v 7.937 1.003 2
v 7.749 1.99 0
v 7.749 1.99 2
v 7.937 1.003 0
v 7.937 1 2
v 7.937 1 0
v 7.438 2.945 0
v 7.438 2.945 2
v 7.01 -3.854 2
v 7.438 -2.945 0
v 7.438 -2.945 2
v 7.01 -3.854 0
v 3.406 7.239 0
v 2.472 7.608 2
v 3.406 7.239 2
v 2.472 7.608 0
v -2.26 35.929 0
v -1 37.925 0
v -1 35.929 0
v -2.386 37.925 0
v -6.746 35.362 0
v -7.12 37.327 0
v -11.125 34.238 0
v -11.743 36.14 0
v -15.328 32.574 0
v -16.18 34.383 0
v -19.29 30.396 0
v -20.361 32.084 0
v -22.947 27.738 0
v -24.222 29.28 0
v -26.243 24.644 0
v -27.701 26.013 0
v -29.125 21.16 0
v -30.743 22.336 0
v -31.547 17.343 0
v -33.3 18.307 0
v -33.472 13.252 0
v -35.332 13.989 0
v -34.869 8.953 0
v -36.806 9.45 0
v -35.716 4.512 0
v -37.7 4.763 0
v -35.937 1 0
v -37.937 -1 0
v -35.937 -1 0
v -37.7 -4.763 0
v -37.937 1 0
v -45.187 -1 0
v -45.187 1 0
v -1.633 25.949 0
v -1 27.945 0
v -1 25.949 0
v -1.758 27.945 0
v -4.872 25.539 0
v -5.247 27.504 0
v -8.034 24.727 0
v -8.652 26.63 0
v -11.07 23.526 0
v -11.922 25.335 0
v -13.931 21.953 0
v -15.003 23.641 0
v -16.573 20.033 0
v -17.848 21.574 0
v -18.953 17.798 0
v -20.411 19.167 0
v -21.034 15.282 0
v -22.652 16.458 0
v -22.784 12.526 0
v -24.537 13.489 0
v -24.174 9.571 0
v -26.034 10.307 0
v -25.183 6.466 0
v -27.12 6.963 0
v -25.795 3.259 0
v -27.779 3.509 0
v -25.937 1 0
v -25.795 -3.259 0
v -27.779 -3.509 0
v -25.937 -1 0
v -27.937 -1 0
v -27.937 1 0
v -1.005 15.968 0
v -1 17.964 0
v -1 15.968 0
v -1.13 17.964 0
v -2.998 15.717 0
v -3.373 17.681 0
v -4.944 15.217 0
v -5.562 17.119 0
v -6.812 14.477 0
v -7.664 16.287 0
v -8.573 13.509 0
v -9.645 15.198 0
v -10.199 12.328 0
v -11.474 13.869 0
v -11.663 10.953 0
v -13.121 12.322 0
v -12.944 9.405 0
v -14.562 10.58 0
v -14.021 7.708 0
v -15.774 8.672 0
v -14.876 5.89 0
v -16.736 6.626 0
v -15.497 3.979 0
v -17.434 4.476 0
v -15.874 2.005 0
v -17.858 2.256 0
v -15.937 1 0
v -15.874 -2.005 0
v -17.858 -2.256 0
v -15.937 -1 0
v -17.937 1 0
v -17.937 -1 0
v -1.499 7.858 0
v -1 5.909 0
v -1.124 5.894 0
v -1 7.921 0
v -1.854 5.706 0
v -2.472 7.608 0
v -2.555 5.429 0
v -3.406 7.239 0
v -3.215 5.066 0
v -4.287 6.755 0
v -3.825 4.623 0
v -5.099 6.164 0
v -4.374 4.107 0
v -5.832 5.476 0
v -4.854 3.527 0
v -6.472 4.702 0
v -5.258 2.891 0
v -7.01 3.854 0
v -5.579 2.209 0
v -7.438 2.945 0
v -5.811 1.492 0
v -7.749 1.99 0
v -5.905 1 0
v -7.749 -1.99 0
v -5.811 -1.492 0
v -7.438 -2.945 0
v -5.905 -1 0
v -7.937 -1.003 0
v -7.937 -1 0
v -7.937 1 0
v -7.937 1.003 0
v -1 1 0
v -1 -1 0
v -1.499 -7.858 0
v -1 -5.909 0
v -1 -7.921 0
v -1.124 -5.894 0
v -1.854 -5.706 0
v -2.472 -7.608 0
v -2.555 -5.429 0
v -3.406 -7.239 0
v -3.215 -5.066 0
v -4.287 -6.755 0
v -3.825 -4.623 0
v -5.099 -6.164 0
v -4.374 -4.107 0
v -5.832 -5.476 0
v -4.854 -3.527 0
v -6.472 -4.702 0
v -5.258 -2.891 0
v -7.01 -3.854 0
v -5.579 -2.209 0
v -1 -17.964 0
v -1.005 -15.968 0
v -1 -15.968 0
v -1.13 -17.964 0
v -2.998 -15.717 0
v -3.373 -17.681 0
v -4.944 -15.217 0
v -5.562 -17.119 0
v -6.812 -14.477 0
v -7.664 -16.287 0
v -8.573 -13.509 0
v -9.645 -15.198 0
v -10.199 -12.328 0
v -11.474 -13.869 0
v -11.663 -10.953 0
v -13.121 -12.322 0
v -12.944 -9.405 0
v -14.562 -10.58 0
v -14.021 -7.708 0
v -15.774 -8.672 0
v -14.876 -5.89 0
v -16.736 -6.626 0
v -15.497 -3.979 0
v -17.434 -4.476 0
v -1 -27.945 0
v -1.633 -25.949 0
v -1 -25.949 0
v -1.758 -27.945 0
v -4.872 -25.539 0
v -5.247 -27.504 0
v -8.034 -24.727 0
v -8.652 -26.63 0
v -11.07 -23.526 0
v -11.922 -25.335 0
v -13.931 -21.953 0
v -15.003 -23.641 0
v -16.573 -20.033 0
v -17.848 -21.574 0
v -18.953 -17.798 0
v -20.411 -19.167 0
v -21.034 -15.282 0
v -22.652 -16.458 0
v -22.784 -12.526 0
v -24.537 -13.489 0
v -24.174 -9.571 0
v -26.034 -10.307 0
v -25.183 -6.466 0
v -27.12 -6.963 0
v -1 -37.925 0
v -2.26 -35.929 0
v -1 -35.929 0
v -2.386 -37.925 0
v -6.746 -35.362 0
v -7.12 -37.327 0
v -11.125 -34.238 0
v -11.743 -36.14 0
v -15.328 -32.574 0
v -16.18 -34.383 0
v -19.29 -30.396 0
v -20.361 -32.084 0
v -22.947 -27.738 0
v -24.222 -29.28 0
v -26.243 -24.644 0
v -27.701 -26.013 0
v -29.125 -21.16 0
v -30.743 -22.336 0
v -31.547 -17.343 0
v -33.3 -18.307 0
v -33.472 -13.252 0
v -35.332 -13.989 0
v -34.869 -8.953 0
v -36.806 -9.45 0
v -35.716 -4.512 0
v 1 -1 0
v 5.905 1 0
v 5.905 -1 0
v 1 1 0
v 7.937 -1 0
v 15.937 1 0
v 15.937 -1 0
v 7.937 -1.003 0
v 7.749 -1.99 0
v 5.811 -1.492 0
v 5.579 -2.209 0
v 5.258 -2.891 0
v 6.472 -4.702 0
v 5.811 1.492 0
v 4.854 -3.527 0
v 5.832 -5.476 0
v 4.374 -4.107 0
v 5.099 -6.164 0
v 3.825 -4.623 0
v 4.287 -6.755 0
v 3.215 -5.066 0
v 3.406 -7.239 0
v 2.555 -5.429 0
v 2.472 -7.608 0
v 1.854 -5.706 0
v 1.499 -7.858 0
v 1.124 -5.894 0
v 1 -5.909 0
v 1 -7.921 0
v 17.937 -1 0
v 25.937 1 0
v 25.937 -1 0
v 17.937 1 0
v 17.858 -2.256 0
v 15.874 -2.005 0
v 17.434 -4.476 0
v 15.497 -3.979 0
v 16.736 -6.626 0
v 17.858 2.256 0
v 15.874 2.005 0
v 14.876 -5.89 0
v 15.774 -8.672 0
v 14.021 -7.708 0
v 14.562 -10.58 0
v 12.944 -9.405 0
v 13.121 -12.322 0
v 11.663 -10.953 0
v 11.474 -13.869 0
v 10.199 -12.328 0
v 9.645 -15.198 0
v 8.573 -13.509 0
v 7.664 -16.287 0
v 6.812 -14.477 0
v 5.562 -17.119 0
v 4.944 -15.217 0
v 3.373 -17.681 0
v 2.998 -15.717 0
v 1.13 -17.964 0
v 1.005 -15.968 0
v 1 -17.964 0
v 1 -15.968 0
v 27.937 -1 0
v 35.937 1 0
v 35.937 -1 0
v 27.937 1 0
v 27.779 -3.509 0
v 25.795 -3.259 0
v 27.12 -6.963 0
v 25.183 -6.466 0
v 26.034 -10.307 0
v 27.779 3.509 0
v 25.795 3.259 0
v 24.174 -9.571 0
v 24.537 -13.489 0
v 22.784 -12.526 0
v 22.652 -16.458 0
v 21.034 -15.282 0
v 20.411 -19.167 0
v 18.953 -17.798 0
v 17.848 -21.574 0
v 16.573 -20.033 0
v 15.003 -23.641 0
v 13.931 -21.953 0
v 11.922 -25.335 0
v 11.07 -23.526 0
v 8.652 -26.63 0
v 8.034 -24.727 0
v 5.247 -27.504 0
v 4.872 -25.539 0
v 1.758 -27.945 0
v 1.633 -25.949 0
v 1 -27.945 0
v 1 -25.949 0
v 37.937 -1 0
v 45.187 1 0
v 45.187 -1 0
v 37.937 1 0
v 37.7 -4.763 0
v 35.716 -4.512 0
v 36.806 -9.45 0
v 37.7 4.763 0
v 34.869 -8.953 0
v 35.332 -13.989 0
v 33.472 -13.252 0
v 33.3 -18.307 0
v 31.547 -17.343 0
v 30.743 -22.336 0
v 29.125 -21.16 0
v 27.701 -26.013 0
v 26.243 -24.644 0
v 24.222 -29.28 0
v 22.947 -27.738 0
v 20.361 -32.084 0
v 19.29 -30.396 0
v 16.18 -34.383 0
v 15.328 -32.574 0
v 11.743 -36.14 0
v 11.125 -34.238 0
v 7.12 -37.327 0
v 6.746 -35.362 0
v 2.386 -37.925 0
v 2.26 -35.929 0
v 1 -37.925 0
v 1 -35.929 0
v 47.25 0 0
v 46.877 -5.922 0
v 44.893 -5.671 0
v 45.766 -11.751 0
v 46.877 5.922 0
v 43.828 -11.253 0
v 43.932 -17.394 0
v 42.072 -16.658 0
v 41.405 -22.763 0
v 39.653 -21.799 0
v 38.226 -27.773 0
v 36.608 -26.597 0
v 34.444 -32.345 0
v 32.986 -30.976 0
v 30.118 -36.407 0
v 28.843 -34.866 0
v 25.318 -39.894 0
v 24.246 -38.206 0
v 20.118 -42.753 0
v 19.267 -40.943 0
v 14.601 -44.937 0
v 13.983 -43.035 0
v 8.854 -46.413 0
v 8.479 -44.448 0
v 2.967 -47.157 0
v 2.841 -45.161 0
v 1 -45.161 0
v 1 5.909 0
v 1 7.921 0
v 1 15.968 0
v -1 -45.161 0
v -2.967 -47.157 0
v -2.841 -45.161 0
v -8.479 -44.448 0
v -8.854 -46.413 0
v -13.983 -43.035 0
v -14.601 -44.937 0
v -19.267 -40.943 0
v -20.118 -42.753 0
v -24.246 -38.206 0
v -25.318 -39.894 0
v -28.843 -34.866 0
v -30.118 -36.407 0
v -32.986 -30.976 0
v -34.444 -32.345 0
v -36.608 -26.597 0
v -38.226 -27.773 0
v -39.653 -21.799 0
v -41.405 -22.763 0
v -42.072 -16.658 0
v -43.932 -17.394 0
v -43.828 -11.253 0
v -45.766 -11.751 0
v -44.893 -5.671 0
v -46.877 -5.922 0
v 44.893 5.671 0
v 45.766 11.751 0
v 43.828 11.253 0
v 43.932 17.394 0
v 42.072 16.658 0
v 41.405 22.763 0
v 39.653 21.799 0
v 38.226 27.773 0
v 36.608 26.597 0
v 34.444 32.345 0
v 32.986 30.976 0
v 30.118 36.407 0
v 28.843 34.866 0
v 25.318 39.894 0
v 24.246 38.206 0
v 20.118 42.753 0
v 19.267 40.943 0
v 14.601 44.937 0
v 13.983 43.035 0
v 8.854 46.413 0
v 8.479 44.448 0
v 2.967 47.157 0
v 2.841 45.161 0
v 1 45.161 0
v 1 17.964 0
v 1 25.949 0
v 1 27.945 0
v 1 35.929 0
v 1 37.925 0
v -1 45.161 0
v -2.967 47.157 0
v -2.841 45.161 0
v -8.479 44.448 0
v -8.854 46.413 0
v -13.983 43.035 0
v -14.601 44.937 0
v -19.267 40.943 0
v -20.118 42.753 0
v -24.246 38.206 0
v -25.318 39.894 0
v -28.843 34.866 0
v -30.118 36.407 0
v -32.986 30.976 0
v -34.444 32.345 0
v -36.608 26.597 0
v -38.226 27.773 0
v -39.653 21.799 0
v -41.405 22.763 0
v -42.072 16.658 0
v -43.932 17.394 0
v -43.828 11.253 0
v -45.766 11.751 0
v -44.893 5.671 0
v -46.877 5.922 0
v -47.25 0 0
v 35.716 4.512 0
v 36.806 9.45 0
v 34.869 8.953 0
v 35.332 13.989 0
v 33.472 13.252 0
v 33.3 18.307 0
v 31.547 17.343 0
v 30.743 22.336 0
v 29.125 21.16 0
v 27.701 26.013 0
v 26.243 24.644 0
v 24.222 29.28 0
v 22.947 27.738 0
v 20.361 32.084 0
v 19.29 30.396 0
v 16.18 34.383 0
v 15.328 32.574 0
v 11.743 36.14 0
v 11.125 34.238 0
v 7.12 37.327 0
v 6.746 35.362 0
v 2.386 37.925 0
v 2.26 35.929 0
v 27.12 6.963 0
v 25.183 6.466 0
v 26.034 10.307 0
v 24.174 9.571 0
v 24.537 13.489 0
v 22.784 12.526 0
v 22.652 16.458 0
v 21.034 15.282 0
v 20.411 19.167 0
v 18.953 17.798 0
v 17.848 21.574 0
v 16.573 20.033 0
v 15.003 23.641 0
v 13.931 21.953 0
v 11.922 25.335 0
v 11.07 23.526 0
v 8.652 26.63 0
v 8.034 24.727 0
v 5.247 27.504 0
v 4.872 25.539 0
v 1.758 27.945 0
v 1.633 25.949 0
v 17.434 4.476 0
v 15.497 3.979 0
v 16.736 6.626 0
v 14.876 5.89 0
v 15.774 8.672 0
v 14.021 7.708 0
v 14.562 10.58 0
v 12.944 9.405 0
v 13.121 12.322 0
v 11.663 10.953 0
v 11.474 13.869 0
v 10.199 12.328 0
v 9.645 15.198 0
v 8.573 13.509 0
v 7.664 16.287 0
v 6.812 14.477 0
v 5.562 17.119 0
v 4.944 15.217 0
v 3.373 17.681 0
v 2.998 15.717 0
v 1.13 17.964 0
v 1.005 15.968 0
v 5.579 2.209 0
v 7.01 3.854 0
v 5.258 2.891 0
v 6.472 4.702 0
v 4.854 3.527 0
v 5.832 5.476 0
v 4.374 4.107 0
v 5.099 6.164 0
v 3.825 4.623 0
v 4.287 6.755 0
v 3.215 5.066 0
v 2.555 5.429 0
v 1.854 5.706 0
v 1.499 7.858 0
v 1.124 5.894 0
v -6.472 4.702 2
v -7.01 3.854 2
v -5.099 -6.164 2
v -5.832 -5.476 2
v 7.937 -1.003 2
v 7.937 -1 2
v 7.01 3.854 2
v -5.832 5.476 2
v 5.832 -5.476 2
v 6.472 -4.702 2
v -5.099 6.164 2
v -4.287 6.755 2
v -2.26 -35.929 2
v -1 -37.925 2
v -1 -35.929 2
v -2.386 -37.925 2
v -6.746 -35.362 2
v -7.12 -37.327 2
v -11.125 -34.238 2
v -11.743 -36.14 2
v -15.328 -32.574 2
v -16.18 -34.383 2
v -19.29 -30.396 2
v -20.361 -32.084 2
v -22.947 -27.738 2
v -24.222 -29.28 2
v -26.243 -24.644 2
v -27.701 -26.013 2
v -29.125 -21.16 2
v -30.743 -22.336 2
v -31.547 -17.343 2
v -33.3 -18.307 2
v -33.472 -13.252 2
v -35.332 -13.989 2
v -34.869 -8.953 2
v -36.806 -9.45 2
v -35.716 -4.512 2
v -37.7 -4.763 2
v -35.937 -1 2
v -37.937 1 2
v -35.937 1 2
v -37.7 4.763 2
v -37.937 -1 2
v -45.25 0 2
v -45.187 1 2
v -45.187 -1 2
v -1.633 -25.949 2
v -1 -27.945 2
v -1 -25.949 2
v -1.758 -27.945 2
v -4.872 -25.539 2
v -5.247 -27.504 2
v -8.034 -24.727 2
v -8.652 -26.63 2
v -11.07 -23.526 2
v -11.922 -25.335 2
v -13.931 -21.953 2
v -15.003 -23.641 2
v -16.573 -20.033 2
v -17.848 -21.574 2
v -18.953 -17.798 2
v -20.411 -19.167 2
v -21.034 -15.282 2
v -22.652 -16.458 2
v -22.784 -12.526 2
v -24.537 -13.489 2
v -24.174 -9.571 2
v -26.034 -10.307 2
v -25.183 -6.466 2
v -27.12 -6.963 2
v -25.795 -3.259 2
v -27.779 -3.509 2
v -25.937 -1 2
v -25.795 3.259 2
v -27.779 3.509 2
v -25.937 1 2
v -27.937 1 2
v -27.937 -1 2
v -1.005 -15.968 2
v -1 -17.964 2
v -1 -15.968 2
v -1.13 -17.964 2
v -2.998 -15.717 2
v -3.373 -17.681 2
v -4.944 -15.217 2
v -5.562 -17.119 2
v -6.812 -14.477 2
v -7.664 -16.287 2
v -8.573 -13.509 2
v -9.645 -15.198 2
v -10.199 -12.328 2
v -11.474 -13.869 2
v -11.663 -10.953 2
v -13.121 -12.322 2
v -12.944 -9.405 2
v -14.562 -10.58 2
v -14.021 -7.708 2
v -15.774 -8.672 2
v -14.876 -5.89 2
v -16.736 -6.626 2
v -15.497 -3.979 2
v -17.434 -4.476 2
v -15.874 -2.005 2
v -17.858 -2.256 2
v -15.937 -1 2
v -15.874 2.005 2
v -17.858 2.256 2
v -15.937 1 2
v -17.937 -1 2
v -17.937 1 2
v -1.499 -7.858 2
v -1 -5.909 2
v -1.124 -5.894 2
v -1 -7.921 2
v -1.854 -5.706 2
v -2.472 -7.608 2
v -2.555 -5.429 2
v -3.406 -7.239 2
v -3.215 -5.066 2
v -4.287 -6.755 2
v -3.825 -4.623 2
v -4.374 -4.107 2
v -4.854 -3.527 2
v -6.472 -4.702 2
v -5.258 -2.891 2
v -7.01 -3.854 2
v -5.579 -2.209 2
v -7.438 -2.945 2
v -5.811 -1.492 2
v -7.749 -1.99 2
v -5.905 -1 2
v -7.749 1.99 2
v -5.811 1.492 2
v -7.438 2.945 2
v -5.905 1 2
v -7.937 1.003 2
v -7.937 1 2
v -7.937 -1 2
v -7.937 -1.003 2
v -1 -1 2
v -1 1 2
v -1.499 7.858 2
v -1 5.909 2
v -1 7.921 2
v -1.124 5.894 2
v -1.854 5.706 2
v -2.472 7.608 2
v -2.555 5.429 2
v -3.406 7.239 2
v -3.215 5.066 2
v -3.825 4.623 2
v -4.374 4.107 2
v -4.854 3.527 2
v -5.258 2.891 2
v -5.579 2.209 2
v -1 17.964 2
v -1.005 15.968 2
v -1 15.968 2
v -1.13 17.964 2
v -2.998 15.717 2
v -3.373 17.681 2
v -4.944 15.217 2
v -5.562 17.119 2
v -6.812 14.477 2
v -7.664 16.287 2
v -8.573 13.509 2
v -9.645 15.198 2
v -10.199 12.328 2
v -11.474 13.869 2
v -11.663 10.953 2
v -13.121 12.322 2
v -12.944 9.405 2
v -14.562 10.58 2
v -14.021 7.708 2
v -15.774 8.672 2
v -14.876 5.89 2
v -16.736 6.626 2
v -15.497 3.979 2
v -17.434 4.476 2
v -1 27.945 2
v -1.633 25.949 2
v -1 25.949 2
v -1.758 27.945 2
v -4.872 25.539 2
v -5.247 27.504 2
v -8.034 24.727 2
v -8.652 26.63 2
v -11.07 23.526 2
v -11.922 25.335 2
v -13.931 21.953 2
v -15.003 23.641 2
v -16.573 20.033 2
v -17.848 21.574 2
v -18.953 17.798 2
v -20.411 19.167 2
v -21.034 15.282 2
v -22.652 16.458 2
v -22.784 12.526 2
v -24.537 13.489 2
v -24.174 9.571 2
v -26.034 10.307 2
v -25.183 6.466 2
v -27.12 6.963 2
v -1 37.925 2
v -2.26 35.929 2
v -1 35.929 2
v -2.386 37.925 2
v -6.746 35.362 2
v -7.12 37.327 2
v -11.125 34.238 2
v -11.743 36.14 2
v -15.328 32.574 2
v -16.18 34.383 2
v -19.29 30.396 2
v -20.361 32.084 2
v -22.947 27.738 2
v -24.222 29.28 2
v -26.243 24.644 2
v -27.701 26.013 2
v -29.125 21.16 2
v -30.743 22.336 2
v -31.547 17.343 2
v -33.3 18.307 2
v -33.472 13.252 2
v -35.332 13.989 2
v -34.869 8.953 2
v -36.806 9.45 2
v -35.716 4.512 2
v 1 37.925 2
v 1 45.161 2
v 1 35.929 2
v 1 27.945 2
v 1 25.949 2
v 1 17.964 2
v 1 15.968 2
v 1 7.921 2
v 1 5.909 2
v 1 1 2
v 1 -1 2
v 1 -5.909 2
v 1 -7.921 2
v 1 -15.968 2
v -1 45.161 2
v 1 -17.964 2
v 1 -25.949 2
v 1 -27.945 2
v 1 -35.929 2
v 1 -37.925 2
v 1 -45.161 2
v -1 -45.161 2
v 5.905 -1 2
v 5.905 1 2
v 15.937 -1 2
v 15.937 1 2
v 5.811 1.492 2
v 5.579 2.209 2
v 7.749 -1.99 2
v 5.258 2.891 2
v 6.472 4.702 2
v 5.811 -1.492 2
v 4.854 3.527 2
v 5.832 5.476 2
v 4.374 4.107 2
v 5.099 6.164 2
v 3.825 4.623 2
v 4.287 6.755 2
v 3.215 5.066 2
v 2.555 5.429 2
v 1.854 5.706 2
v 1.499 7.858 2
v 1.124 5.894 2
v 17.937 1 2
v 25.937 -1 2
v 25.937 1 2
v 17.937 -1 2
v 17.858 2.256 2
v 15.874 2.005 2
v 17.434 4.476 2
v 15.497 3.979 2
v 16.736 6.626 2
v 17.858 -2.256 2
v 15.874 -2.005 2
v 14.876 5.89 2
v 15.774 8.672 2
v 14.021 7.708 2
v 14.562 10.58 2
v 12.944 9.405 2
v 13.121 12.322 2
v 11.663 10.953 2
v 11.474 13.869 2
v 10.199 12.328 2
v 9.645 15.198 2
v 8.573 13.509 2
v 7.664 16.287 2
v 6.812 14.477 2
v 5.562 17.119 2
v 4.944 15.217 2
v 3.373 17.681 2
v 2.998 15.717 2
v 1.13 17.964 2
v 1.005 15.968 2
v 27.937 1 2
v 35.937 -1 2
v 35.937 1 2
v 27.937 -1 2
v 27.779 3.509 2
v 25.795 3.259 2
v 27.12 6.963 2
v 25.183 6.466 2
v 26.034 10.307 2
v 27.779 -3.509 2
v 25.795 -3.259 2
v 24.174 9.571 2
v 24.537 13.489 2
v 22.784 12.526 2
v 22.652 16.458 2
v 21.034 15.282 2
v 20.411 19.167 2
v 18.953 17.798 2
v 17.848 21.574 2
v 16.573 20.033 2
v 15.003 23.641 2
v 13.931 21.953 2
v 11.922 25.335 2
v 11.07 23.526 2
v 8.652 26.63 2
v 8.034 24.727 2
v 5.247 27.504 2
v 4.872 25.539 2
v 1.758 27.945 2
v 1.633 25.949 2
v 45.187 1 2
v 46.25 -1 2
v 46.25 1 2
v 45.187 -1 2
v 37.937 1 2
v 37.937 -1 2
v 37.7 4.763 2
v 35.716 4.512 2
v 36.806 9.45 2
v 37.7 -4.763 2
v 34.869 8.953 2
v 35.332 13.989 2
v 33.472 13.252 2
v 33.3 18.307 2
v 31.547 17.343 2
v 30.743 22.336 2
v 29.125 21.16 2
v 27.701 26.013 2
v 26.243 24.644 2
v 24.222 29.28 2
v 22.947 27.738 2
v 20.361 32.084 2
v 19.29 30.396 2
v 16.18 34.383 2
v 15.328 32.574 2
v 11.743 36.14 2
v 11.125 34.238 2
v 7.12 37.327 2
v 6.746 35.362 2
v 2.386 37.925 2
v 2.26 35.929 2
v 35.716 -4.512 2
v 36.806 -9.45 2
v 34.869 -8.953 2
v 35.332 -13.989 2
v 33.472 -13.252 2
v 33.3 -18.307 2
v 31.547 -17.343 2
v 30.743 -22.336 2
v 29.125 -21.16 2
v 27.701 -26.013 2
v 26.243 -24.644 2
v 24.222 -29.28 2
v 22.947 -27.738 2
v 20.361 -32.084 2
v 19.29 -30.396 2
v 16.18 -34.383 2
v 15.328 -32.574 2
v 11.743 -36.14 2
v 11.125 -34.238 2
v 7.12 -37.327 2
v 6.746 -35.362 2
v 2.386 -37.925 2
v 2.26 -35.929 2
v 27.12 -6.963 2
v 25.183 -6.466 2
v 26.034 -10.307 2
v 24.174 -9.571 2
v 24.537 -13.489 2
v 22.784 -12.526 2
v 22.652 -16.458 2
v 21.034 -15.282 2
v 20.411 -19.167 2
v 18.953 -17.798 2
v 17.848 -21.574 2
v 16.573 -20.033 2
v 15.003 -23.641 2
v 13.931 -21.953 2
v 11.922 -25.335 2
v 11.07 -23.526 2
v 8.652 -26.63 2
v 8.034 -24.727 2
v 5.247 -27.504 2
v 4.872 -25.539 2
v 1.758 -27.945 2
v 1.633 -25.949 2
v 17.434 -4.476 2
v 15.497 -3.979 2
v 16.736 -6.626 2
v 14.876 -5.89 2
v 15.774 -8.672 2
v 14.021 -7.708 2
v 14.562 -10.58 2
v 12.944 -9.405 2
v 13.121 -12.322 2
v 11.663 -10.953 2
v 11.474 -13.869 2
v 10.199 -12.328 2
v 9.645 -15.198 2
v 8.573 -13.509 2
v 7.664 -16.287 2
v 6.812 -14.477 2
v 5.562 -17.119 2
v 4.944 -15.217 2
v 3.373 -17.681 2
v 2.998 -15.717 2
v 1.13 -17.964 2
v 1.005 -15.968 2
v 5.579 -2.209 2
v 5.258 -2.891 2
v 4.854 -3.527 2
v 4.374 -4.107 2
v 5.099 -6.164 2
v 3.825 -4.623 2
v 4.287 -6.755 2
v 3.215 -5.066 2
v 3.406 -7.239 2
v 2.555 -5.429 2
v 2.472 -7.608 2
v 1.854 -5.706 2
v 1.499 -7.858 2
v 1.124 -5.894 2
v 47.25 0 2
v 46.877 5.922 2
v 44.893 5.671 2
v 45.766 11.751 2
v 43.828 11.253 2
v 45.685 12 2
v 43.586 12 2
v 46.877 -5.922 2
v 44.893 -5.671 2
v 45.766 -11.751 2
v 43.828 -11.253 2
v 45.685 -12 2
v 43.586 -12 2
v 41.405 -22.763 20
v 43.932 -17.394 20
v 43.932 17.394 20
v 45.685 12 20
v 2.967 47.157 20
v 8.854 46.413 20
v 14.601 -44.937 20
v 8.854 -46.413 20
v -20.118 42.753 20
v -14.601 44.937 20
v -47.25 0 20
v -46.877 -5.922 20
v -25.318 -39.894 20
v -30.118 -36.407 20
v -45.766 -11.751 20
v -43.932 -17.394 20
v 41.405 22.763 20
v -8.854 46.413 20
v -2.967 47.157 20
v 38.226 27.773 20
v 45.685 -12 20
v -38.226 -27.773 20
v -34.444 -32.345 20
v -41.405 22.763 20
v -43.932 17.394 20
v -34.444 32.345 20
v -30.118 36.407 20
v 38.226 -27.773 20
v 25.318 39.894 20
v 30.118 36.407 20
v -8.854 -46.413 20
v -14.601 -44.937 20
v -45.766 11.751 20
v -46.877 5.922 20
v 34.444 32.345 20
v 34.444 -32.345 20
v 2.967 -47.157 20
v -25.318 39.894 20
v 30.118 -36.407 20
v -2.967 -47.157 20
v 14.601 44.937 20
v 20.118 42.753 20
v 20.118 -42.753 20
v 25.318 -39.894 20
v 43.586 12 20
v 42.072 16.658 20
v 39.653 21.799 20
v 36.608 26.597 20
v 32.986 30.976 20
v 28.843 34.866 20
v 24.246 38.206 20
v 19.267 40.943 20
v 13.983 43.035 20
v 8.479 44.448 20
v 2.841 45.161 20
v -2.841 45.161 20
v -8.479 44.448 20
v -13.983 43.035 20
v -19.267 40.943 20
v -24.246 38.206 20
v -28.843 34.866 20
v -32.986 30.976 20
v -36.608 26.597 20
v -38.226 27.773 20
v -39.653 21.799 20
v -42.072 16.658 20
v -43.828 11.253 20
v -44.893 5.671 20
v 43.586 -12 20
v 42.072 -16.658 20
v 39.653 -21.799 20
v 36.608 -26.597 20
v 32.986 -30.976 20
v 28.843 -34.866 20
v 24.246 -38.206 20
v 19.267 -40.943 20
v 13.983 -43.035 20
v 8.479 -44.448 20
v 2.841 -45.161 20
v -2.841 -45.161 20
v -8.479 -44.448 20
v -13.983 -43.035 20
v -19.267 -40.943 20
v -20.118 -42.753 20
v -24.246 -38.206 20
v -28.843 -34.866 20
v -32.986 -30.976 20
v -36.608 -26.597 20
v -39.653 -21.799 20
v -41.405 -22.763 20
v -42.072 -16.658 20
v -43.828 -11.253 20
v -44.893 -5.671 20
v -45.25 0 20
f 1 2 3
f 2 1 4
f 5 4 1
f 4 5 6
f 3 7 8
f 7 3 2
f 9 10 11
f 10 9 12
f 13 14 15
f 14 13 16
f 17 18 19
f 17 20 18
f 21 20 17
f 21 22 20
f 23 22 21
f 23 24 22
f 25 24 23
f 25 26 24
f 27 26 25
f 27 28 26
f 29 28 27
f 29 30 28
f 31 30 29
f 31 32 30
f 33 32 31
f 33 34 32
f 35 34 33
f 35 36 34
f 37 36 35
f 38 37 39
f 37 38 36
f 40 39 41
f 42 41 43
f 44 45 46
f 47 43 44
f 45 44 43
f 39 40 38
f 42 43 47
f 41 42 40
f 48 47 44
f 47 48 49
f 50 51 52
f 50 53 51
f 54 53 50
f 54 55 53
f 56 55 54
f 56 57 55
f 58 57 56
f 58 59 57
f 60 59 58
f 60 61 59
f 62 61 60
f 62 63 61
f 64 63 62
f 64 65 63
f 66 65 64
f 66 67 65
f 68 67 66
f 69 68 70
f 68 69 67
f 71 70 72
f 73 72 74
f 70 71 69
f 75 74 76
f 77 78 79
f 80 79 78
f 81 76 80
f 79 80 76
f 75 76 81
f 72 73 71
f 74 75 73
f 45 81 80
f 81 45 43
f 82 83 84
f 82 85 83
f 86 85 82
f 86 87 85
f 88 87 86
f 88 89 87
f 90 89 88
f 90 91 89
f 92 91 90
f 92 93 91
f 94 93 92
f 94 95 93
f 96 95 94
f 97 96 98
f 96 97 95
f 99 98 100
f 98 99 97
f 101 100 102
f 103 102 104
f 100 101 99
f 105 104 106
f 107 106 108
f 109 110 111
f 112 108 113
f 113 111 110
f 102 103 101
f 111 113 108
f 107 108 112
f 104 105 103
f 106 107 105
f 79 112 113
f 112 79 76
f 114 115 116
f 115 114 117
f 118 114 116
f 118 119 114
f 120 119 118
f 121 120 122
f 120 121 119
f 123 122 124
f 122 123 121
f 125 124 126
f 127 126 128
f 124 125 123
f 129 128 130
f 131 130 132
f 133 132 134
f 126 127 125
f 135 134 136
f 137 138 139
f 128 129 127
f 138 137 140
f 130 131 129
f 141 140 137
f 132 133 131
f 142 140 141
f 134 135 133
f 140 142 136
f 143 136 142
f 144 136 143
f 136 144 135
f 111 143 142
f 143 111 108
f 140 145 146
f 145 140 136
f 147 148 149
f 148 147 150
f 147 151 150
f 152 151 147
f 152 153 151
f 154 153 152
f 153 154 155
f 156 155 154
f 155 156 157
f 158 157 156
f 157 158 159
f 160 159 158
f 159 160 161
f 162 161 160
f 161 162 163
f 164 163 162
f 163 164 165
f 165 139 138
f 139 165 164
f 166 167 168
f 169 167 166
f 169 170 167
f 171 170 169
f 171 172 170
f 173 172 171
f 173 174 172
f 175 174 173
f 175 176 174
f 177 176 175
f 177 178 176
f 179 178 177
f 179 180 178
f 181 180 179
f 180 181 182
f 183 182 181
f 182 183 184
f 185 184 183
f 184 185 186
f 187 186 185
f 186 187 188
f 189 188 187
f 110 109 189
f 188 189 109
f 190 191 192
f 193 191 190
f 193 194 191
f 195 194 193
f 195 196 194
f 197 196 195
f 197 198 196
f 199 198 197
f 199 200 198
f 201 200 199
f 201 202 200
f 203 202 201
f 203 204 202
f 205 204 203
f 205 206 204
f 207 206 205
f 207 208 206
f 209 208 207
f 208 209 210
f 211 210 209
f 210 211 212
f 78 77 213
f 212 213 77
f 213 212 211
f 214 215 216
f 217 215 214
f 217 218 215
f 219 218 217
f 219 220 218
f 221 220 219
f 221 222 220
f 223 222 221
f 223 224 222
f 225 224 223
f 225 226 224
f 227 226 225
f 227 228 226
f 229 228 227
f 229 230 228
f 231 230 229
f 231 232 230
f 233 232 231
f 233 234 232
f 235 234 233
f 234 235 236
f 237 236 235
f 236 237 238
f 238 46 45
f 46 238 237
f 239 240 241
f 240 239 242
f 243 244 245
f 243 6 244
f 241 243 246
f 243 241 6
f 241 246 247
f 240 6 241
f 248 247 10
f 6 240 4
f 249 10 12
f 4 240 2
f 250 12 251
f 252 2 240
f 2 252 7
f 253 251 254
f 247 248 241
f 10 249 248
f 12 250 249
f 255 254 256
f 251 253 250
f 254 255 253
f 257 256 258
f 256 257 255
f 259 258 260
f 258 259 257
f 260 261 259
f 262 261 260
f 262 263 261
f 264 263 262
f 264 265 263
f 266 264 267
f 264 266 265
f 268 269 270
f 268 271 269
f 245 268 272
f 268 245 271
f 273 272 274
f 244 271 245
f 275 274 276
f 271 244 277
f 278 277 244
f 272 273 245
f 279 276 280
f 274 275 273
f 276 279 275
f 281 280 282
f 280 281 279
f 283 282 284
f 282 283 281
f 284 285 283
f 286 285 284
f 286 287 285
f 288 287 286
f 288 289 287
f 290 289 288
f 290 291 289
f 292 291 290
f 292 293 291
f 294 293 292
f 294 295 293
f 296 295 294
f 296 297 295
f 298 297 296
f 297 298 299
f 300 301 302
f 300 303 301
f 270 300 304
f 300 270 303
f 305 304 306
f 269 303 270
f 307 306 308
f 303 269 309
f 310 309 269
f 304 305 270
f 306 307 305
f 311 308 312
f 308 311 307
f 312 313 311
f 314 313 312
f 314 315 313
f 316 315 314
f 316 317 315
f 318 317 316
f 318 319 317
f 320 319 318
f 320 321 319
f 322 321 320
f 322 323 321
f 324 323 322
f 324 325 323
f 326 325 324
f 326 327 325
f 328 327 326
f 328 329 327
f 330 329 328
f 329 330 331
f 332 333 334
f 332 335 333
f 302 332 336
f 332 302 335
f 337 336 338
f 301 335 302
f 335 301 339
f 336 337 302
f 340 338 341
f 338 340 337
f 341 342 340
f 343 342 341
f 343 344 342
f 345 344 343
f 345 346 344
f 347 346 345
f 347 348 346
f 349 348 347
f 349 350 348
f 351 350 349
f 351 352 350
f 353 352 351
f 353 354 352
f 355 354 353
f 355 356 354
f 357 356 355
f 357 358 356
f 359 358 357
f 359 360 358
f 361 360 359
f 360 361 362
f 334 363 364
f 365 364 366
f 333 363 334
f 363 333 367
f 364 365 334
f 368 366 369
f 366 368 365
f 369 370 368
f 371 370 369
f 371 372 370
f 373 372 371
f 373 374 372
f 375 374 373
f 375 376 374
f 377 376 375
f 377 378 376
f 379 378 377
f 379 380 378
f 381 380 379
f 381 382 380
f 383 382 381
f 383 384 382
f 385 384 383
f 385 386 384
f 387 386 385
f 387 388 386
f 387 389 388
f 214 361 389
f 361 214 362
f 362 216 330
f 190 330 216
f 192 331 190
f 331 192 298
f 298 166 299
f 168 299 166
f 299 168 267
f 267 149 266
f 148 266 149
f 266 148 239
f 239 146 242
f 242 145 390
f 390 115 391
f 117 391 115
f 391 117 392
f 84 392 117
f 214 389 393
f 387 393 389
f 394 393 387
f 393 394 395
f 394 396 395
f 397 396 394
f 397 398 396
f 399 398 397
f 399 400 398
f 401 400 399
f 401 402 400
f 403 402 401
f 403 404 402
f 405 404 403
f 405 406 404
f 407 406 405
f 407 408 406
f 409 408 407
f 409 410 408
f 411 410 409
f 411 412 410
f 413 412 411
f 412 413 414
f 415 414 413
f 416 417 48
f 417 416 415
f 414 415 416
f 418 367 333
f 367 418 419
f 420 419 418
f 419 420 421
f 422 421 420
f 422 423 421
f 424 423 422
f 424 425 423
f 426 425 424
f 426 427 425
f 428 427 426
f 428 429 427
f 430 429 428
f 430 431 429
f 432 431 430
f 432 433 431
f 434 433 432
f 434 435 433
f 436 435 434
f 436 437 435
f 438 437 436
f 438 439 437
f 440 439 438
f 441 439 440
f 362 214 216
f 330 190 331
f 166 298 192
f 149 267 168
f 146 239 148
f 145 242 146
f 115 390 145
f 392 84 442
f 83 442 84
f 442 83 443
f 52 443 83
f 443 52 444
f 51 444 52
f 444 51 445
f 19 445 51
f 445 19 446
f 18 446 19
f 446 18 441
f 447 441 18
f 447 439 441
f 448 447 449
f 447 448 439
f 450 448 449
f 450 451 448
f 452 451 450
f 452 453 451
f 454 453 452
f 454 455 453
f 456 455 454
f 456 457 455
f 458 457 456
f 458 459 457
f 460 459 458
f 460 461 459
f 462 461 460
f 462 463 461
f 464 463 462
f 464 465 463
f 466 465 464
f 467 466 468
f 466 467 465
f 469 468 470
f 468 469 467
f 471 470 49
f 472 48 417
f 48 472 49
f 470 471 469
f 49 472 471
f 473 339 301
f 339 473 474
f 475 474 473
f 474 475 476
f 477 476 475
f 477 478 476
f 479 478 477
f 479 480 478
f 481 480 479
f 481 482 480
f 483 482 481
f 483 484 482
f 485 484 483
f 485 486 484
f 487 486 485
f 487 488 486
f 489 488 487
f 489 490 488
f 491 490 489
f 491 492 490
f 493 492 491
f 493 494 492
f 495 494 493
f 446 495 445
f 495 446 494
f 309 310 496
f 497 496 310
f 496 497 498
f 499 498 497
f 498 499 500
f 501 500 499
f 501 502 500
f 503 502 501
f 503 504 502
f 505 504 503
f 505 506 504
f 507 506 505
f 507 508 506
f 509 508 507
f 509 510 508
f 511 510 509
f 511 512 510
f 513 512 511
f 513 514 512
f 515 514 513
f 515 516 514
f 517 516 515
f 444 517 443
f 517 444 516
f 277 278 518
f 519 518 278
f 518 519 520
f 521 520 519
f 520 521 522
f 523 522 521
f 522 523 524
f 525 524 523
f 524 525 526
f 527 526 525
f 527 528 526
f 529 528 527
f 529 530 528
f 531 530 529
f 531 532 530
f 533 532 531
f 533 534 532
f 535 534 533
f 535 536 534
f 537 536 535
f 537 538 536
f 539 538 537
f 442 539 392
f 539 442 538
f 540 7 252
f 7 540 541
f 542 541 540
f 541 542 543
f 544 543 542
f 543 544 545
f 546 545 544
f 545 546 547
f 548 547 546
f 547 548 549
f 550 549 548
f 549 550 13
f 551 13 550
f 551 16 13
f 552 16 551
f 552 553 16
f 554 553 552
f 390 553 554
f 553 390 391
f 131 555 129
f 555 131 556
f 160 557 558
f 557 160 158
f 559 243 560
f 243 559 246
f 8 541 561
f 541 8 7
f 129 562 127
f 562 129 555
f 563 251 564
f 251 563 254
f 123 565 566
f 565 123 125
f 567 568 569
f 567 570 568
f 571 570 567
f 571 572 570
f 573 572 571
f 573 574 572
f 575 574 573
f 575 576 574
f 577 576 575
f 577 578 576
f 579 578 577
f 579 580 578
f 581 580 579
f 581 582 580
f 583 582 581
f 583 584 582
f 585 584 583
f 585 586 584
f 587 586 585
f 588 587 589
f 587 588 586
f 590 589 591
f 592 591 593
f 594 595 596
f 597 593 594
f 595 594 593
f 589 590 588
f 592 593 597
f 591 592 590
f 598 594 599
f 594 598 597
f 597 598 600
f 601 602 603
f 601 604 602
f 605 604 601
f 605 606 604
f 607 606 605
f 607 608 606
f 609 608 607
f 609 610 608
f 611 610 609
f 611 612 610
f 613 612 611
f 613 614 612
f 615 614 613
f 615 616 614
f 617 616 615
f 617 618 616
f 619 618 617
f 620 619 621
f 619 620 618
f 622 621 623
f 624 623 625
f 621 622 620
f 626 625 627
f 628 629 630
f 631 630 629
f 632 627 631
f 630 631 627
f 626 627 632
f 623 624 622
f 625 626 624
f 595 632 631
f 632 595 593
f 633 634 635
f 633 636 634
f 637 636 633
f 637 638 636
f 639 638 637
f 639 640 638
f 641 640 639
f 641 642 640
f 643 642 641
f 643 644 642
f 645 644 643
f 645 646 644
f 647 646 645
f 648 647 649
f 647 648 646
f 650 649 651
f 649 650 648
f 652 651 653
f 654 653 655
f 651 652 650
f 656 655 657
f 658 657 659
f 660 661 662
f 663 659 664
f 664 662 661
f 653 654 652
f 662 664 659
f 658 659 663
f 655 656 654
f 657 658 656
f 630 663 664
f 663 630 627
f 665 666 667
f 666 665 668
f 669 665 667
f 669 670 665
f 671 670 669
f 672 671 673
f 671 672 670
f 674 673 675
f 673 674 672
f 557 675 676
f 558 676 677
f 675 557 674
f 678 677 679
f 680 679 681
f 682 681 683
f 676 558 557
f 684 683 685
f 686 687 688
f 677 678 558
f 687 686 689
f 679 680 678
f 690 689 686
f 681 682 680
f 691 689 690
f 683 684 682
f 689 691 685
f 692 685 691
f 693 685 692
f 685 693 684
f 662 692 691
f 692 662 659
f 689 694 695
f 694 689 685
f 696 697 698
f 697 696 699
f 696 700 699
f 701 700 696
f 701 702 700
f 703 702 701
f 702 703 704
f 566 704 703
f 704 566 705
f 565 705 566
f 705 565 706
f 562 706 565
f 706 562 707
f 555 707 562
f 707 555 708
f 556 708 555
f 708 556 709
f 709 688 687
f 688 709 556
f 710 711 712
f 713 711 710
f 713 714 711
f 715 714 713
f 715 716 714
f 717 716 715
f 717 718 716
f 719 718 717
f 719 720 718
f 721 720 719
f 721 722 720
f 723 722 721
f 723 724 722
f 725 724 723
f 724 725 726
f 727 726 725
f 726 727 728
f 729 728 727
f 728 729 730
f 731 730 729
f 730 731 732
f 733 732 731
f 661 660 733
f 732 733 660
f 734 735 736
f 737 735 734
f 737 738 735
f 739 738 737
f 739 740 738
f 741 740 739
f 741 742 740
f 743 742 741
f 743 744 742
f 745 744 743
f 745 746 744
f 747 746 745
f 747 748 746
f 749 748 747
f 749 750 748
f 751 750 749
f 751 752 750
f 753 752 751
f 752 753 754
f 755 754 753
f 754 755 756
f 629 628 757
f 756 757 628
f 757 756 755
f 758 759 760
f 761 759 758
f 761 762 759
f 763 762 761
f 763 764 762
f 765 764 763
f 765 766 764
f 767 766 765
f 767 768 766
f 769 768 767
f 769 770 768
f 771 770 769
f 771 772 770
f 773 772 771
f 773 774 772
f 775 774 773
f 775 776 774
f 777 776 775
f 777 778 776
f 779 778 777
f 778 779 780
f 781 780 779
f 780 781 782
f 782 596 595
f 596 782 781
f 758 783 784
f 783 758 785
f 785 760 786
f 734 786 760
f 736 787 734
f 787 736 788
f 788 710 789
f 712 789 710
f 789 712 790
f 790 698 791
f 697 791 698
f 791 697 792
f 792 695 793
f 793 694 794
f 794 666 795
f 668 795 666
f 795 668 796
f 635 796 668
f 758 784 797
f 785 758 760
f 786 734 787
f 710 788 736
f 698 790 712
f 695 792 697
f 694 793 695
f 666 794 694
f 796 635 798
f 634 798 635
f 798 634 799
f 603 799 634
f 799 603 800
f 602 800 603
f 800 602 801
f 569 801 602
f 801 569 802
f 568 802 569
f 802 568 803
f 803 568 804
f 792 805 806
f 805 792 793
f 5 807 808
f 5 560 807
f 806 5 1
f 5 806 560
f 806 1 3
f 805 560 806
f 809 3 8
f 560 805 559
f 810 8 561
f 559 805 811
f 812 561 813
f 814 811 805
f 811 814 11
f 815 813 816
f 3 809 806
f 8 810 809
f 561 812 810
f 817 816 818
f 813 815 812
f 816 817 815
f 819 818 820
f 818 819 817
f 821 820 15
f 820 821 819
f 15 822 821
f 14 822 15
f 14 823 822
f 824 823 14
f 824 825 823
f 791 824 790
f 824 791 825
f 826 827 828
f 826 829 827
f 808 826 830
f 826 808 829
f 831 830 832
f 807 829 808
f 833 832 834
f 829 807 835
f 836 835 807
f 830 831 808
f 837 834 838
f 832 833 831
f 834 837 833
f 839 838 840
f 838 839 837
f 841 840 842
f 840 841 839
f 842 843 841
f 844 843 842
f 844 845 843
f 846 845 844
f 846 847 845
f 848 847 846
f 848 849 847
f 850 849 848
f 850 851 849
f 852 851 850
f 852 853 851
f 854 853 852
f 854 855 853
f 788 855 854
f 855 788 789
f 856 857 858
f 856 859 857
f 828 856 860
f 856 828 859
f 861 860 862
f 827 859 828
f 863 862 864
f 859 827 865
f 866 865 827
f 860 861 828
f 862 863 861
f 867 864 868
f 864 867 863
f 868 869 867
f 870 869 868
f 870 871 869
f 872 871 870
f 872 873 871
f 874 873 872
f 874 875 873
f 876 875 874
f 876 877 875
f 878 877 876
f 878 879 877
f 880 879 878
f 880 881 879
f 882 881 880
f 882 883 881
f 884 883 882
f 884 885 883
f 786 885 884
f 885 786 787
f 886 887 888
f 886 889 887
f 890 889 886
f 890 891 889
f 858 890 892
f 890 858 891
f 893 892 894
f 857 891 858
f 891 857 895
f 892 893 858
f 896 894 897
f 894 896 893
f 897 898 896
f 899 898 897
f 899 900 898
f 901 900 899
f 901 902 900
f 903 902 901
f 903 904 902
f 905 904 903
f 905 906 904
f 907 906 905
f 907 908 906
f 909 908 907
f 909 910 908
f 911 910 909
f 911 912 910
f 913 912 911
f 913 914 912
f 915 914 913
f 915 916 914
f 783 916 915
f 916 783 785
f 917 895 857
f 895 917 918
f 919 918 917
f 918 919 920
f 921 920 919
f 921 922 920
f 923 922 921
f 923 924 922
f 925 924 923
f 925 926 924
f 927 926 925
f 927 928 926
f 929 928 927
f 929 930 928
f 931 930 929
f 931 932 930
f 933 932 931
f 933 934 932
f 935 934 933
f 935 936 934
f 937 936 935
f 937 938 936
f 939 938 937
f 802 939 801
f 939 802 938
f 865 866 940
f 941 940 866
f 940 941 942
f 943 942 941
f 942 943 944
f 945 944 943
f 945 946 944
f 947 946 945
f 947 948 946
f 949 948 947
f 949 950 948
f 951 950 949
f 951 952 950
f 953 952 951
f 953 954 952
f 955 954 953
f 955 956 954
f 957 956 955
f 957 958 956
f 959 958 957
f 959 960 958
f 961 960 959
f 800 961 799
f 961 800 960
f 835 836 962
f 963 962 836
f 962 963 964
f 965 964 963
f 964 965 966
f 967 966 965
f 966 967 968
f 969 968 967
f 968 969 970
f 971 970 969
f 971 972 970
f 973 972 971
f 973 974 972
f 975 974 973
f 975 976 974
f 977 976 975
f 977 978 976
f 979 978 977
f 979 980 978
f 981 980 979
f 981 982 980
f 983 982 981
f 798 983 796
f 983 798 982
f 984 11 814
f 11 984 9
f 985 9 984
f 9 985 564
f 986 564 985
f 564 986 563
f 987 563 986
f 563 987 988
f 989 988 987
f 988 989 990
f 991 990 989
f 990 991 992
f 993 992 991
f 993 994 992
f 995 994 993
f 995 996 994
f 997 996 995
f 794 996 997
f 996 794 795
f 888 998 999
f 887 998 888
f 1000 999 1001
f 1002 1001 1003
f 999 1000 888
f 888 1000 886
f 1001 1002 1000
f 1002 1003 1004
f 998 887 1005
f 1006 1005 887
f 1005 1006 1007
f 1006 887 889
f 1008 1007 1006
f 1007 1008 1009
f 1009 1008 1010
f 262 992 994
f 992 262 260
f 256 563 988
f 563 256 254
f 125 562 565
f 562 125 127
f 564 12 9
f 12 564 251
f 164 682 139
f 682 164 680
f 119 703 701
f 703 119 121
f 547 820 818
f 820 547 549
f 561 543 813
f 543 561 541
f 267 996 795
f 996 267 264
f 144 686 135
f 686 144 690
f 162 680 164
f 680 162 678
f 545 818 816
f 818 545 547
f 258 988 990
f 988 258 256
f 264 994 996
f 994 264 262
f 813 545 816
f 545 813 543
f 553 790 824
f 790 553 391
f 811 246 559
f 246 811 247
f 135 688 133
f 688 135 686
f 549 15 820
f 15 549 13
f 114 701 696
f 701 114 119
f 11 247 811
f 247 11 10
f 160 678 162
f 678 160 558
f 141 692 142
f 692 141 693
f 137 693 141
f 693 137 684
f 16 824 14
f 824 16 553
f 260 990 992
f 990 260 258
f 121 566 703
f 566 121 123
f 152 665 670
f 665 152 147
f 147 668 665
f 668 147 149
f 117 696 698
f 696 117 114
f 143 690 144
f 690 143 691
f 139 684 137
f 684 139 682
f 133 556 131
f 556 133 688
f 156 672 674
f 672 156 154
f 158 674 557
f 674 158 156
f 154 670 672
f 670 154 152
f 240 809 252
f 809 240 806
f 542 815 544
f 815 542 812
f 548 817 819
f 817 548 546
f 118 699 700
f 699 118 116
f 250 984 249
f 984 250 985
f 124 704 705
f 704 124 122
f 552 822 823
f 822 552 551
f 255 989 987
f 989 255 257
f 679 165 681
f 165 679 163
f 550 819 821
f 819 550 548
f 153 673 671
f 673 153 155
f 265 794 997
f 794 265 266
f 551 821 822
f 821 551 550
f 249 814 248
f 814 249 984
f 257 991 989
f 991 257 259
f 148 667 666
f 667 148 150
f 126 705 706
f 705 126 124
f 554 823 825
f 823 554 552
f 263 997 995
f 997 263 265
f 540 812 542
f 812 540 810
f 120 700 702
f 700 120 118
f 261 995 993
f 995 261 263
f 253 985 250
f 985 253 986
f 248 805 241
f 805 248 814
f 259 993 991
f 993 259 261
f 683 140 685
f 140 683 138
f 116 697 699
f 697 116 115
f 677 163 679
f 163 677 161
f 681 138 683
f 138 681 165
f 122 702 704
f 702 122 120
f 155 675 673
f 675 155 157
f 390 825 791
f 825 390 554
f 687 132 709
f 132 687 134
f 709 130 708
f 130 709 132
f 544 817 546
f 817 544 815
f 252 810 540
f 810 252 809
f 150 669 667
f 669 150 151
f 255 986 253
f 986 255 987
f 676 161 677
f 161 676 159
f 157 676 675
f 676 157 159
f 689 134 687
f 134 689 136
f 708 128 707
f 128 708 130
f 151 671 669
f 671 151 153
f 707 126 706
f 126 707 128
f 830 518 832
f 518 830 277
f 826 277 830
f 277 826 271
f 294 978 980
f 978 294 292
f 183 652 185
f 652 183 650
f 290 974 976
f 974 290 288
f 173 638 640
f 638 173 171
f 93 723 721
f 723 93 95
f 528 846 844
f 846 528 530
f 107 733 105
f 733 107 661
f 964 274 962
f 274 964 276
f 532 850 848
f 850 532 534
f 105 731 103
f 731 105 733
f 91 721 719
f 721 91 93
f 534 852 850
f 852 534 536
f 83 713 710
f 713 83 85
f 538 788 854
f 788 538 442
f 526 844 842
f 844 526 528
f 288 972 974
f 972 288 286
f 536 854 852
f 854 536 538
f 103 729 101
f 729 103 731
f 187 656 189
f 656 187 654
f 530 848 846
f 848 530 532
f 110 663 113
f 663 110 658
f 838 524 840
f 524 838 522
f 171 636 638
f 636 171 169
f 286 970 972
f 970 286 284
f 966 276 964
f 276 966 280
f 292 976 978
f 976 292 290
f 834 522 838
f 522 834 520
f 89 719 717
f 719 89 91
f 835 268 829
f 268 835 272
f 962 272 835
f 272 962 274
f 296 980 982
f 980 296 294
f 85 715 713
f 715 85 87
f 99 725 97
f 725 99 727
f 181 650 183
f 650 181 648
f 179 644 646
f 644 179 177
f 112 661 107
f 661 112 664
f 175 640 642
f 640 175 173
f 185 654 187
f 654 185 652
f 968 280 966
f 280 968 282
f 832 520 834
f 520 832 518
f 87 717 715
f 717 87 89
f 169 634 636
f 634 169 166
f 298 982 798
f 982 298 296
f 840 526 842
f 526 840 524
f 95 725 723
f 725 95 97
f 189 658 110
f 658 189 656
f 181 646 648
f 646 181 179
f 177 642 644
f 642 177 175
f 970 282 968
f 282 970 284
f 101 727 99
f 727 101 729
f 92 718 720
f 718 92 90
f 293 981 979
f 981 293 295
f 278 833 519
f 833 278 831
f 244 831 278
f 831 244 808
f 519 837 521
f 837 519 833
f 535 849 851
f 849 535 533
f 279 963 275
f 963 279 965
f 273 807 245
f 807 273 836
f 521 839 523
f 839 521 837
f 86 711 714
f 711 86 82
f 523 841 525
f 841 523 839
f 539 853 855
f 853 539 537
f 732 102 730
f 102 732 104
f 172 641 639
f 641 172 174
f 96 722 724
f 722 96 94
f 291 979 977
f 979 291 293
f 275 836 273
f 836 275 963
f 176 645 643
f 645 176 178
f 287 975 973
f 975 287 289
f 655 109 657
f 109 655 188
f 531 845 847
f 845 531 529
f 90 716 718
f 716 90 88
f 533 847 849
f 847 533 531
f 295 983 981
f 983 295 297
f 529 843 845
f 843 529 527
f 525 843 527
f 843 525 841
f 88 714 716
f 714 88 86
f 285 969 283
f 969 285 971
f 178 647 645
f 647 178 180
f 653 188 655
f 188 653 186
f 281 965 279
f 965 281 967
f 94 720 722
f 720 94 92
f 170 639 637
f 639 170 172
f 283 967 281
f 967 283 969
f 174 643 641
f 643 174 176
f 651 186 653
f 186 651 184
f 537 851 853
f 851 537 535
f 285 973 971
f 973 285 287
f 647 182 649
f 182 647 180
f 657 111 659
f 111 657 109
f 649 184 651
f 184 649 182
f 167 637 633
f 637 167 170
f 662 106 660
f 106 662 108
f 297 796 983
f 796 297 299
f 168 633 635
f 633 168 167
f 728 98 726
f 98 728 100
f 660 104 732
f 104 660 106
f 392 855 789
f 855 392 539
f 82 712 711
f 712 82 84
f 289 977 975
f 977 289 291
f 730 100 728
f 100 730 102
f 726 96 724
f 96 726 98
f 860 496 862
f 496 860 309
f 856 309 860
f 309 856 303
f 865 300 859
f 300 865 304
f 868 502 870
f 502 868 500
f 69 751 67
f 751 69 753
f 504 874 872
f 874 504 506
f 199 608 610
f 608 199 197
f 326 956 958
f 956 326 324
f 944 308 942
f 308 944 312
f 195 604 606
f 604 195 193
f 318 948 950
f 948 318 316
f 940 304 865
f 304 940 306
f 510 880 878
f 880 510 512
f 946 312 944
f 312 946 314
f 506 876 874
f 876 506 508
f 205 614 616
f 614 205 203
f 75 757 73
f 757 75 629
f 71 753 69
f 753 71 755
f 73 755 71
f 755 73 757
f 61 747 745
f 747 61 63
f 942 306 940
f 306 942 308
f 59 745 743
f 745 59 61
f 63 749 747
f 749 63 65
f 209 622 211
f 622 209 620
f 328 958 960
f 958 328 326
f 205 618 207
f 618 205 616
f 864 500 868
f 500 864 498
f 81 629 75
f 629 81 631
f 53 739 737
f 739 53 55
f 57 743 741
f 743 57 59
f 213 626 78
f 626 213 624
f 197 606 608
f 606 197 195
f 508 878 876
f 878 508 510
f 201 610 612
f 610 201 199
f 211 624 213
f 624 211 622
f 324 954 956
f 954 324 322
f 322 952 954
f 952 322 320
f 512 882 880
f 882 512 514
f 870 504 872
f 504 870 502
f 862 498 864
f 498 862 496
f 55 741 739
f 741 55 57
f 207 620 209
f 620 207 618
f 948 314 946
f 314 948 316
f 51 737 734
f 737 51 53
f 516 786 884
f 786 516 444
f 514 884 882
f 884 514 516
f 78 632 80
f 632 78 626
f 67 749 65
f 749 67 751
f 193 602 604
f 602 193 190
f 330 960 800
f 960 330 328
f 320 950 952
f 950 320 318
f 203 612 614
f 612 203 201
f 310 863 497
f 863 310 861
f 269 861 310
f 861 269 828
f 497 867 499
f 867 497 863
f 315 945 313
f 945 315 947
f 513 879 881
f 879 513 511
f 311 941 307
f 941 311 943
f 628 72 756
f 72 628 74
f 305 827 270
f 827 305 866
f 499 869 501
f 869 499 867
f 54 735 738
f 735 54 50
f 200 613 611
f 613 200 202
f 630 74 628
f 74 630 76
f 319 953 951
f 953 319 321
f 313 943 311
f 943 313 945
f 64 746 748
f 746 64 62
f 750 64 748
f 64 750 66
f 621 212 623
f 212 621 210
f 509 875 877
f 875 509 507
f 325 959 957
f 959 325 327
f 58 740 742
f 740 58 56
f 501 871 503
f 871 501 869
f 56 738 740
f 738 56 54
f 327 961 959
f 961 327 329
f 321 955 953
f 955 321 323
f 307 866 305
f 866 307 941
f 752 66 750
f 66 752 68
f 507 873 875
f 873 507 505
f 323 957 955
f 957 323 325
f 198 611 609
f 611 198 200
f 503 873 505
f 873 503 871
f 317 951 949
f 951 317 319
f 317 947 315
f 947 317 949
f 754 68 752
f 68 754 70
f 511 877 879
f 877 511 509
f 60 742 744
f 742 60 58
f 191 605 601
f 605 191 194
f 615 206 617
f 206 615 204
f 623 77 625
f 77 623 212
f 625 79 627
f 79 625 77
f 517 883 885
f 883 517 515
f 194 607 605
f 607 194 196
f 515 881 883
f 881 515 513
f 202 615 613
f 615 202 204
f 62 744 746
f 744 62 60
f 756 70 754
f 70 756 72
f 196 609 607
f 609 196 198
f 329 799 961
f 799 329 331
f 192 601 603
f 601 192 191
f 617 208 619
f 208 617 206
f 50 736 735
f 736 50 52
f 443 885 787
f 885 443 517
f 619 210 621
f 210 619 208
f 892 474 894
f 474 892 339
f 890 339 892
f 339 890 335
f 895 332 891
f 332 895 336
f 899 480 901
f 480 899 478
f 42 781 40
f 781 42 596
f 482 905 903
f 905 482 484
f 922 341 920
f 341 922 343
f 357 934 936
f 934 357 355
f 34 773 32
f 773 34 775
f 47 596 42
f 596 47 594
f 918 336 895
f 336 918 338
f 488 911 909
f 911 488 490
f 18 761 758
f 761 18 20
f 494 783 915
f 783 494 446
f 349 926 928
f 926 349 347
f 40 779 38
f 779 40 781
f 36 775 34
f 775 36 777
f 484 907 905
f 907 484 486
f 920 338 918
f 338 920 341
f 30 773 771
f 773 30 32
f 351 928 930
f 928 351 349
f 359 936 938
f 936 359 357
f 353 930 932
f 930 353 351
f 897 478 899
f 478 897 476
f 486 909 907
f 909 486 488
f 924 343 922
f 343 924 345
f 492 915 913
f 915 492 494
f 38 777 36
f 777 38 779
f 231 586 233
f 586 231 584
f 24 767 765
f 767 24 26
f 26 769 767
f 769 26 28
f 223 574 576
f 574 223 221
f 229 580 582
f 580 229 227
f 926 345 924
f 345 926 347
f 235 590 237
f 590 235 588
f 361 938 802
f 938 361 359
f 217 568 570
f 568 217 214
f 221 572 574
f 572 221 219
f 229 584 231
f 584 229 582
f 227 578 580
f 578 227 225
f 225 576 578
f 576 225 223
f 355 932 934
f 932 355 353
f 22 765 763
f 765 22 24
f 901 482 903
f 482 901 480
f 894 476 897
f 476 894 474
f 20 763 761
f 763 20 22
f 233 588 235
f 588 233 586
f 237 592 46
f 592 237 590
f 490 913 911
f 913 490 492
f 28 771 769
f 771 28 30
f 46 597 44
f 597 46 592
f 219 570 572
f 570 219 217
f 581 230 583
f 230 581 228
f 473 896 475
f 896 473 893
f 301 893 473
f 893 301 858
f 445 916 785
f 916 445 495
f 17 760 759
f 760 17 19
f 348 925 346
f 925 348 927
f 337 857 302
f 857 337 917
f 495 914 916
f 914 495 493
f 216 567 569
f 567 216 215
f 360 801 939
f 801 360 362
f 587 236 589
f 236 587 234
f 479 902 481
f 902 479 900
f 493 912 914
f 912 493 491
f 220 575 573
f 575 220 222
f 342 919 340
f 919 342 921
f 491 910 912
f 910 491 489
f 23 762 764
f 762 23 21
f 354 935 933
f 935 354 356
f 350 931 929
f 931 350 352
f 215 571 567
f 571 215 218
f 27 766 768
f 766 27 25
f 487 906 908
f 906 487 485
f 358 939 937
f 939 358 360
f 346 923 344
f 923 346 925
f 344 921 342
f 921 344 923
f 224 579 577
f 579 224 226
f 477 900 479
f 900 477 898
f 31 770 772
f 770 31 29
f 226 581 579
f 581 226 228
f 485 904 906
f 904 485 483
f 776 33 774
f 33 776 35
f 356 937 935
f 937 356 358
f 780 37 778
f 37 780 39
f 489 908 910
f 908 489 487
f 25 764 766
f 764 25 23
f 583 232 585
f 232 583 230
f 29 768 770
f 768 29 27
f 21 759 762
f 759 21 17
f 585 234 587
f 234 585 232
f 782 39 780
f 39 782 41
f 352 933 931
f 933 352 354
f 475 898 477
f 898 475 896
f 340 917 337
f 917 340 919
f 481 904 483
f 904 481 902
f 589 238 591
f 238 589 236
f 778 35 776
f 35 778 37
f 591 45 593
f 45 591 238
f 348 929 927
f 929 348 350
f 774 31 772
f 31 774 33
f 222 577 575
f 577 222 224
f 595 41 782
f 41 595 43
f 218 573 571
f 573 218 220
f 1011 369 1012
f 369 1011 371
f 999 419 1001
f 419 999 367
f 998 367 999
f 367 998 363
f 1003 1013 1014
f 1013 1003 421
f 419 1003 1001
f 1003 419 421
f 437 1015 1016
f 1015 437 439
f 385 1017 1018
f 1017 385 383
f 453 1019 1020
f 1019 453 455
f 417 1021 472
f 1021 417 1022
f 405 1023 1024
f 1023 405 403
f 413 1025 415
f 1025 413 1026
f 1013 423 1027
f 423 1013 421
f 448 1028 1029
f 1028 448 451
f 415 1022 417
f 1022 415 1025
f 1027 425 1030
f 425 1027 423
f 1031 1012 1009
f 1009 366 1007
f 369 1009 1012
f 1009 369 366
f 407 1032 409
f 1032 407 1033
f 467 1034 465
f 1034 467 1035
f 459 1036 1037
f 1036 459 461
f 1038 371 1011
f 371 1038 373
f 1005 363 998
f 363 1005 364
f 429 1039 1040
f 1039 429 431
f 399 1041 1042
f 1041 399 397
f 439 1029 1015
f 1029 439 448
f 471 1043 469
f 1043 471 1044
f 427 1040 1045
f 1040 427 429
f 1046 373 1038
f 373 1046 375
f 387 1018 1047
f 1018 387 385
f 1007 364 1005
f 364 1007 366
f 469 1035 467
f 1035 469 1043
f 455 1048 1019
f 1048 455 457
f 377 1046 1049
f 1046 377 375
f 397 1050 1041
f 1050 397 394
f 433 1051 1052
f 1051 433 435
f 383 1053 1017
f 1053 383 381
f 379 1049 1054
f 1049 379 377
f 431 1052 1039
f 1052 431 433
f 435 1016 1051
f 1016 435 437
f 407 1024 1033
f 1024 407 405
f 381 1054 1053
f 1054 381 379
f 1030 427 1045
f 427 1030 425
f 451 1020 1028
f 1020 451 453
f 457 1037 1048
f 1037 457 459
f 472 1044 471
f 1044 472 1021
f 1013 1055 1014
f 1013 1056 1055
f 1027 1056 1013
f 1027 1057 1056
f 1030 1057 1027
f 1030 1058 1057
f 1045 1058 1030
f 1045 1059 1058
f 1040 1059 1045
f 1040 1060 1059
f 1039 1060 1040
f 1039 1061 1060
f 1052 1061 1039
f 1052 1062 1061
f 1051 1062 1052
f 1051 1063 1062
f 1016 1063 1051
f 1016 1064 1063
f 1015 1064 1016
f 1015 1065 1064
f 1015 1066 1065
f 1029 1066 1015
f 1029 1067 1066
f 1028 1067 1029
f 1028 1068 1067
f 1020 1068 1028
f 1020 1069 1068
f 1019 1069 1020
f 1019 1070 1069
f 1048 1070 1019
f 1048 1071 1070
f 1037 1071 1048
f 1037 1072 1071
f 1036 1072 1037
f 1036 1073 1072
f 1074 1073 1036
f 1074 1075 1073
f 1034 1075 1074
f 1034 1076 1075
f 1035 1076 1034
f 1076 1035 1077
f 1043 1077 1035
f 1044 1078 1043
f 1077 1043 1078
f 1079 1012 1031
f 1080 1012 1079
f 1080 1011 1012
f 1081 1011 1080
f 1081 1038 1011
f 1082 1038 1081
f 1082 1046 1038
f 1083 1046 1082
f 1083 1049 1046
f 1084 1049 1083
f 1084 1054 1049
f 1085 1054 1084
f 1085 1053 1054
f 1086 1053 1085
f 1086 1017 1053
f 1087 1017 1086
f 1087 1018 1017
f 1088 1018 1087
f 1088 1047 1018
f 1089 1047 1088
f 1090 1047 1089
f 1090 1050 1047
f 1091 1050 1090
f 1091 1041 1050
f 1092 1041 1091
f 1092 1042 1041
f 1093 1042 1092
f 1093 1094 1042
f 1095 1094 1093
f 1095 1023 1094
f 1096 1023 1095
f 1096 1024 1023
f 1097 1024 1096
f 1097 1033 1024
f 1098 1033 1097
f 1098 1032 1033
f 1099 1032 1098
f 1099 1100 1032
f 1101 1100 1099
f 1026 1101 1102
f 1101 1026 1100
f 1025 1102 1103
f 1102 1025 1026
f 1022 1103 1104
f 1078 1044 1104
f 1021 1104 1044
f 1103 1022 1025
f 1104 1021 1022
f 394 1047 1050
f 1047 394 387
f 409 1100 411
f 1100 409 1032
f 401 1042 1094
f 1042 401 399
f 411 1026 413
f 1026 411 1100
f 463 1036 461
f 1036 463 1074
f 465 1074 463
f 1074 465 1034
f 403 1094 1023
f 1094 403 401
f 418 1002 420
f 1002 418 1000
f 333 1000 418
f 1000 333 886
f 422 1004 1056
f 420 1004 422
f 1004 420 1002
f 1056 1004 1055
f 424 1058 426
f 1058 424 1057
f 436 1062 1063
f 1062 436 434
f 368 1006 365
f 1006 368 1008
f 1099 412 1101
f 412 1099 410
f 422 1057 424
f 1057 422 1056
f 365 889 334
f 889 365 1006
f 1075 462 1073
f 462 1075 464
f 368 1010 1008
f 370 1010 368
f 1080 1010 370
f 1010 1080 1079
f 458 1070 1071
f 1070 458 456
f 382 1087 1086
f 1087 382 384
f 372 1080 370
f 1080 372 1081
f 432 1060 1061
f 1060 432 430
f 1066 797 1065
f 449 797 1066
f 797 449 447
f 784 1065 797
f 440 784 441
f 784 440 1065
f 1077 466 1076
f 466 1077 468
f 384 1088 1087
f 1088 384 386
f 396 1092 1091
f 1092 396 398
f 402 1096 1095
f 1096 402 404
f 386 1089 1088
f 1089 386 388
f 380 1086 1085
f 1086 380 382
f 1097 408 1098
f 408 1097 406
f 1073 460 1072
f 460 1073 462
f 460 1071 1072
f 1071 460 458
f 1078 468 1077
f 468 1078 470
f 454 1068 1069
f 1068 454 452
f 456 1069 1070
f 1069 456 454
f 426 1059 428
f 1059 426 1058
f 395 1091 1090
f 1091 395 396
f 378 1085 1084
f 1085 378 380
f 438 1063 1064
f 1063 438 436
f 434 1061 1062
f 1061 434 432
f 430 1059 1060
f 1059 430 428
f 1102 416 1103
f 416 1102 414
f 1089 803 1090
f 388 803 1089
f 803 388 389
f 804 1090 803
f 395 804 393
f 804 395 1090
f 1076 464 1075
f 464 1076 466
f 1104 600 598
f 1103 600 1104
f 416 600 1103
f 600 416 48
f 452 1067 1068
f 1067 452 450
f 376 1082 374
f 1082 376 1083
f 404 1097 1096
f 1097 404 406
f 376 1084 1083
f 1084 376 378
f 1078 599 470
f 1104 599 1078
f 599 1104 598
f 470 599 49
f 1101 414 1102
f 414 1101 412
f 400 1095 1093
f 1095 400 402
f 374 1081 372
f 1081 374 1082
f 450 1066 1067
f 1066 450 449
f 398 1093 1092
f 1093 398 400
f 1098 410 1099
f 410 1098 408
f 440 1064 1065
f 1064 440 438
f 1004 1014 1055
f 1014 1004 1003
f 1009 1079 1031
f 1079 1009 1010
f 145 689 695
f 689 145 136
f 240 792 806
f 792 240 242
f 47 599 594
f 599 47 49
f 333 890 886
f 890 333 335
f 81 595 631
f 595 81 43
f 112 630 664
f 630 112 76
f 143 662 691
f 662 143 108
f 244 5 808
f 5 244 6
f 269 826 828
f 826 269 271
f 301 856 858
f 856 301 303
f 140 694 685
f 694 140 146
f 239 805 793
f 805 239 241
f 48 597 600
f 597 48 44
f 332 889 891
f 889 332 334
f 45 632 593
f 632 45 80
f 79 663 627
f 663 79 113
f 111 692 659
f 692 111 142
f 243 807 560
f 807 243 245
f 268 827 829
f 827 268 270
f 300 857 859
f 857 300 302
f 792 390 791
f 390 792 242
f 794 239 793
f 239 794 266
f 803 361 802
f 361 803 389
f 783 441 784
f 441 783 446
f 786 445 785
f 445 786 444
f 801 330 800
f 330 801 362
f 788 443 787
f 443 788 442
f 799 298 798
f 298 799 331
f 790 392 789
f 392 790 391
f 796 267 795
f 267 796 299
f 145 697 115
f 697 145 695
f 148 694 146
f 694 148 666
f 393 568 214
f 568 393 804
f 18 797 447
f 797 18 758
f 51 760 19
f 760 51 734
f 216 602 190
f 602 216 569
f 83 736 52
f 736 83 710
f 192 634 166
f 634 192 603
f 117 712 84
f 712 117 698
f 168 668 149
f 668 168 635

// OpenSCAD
$fn=50;

spacing = 8;
radius = 47.25;
thickness = 2;
height = 20;

// Horizontal bar
translate([-radius + thickness / 2, -thickness/2, 0])
cube([radius * 2 - thickness, thickness, thickness]);

// Vertical bar
translate([-thickness/2, -radius + thickness / 2, 0])
cube([thickness, radius * 2 - thickness, thickness]);

// Inner circles
for(i = [spacing:spacing + thickness:radius]){
    difference(){
        cylinder(thickness, i , i);
        cylinder(thickness, i - thickness, i - thickness);
    }
}

// Outer cylinder
difference(){
    cylinder(height, radius, radius);
    cylinder(height, radius - thickness, radius - thickness);
    
    translate([radius-5,-12,thickness])
    cube([10, 24, height - thickness]);
}
